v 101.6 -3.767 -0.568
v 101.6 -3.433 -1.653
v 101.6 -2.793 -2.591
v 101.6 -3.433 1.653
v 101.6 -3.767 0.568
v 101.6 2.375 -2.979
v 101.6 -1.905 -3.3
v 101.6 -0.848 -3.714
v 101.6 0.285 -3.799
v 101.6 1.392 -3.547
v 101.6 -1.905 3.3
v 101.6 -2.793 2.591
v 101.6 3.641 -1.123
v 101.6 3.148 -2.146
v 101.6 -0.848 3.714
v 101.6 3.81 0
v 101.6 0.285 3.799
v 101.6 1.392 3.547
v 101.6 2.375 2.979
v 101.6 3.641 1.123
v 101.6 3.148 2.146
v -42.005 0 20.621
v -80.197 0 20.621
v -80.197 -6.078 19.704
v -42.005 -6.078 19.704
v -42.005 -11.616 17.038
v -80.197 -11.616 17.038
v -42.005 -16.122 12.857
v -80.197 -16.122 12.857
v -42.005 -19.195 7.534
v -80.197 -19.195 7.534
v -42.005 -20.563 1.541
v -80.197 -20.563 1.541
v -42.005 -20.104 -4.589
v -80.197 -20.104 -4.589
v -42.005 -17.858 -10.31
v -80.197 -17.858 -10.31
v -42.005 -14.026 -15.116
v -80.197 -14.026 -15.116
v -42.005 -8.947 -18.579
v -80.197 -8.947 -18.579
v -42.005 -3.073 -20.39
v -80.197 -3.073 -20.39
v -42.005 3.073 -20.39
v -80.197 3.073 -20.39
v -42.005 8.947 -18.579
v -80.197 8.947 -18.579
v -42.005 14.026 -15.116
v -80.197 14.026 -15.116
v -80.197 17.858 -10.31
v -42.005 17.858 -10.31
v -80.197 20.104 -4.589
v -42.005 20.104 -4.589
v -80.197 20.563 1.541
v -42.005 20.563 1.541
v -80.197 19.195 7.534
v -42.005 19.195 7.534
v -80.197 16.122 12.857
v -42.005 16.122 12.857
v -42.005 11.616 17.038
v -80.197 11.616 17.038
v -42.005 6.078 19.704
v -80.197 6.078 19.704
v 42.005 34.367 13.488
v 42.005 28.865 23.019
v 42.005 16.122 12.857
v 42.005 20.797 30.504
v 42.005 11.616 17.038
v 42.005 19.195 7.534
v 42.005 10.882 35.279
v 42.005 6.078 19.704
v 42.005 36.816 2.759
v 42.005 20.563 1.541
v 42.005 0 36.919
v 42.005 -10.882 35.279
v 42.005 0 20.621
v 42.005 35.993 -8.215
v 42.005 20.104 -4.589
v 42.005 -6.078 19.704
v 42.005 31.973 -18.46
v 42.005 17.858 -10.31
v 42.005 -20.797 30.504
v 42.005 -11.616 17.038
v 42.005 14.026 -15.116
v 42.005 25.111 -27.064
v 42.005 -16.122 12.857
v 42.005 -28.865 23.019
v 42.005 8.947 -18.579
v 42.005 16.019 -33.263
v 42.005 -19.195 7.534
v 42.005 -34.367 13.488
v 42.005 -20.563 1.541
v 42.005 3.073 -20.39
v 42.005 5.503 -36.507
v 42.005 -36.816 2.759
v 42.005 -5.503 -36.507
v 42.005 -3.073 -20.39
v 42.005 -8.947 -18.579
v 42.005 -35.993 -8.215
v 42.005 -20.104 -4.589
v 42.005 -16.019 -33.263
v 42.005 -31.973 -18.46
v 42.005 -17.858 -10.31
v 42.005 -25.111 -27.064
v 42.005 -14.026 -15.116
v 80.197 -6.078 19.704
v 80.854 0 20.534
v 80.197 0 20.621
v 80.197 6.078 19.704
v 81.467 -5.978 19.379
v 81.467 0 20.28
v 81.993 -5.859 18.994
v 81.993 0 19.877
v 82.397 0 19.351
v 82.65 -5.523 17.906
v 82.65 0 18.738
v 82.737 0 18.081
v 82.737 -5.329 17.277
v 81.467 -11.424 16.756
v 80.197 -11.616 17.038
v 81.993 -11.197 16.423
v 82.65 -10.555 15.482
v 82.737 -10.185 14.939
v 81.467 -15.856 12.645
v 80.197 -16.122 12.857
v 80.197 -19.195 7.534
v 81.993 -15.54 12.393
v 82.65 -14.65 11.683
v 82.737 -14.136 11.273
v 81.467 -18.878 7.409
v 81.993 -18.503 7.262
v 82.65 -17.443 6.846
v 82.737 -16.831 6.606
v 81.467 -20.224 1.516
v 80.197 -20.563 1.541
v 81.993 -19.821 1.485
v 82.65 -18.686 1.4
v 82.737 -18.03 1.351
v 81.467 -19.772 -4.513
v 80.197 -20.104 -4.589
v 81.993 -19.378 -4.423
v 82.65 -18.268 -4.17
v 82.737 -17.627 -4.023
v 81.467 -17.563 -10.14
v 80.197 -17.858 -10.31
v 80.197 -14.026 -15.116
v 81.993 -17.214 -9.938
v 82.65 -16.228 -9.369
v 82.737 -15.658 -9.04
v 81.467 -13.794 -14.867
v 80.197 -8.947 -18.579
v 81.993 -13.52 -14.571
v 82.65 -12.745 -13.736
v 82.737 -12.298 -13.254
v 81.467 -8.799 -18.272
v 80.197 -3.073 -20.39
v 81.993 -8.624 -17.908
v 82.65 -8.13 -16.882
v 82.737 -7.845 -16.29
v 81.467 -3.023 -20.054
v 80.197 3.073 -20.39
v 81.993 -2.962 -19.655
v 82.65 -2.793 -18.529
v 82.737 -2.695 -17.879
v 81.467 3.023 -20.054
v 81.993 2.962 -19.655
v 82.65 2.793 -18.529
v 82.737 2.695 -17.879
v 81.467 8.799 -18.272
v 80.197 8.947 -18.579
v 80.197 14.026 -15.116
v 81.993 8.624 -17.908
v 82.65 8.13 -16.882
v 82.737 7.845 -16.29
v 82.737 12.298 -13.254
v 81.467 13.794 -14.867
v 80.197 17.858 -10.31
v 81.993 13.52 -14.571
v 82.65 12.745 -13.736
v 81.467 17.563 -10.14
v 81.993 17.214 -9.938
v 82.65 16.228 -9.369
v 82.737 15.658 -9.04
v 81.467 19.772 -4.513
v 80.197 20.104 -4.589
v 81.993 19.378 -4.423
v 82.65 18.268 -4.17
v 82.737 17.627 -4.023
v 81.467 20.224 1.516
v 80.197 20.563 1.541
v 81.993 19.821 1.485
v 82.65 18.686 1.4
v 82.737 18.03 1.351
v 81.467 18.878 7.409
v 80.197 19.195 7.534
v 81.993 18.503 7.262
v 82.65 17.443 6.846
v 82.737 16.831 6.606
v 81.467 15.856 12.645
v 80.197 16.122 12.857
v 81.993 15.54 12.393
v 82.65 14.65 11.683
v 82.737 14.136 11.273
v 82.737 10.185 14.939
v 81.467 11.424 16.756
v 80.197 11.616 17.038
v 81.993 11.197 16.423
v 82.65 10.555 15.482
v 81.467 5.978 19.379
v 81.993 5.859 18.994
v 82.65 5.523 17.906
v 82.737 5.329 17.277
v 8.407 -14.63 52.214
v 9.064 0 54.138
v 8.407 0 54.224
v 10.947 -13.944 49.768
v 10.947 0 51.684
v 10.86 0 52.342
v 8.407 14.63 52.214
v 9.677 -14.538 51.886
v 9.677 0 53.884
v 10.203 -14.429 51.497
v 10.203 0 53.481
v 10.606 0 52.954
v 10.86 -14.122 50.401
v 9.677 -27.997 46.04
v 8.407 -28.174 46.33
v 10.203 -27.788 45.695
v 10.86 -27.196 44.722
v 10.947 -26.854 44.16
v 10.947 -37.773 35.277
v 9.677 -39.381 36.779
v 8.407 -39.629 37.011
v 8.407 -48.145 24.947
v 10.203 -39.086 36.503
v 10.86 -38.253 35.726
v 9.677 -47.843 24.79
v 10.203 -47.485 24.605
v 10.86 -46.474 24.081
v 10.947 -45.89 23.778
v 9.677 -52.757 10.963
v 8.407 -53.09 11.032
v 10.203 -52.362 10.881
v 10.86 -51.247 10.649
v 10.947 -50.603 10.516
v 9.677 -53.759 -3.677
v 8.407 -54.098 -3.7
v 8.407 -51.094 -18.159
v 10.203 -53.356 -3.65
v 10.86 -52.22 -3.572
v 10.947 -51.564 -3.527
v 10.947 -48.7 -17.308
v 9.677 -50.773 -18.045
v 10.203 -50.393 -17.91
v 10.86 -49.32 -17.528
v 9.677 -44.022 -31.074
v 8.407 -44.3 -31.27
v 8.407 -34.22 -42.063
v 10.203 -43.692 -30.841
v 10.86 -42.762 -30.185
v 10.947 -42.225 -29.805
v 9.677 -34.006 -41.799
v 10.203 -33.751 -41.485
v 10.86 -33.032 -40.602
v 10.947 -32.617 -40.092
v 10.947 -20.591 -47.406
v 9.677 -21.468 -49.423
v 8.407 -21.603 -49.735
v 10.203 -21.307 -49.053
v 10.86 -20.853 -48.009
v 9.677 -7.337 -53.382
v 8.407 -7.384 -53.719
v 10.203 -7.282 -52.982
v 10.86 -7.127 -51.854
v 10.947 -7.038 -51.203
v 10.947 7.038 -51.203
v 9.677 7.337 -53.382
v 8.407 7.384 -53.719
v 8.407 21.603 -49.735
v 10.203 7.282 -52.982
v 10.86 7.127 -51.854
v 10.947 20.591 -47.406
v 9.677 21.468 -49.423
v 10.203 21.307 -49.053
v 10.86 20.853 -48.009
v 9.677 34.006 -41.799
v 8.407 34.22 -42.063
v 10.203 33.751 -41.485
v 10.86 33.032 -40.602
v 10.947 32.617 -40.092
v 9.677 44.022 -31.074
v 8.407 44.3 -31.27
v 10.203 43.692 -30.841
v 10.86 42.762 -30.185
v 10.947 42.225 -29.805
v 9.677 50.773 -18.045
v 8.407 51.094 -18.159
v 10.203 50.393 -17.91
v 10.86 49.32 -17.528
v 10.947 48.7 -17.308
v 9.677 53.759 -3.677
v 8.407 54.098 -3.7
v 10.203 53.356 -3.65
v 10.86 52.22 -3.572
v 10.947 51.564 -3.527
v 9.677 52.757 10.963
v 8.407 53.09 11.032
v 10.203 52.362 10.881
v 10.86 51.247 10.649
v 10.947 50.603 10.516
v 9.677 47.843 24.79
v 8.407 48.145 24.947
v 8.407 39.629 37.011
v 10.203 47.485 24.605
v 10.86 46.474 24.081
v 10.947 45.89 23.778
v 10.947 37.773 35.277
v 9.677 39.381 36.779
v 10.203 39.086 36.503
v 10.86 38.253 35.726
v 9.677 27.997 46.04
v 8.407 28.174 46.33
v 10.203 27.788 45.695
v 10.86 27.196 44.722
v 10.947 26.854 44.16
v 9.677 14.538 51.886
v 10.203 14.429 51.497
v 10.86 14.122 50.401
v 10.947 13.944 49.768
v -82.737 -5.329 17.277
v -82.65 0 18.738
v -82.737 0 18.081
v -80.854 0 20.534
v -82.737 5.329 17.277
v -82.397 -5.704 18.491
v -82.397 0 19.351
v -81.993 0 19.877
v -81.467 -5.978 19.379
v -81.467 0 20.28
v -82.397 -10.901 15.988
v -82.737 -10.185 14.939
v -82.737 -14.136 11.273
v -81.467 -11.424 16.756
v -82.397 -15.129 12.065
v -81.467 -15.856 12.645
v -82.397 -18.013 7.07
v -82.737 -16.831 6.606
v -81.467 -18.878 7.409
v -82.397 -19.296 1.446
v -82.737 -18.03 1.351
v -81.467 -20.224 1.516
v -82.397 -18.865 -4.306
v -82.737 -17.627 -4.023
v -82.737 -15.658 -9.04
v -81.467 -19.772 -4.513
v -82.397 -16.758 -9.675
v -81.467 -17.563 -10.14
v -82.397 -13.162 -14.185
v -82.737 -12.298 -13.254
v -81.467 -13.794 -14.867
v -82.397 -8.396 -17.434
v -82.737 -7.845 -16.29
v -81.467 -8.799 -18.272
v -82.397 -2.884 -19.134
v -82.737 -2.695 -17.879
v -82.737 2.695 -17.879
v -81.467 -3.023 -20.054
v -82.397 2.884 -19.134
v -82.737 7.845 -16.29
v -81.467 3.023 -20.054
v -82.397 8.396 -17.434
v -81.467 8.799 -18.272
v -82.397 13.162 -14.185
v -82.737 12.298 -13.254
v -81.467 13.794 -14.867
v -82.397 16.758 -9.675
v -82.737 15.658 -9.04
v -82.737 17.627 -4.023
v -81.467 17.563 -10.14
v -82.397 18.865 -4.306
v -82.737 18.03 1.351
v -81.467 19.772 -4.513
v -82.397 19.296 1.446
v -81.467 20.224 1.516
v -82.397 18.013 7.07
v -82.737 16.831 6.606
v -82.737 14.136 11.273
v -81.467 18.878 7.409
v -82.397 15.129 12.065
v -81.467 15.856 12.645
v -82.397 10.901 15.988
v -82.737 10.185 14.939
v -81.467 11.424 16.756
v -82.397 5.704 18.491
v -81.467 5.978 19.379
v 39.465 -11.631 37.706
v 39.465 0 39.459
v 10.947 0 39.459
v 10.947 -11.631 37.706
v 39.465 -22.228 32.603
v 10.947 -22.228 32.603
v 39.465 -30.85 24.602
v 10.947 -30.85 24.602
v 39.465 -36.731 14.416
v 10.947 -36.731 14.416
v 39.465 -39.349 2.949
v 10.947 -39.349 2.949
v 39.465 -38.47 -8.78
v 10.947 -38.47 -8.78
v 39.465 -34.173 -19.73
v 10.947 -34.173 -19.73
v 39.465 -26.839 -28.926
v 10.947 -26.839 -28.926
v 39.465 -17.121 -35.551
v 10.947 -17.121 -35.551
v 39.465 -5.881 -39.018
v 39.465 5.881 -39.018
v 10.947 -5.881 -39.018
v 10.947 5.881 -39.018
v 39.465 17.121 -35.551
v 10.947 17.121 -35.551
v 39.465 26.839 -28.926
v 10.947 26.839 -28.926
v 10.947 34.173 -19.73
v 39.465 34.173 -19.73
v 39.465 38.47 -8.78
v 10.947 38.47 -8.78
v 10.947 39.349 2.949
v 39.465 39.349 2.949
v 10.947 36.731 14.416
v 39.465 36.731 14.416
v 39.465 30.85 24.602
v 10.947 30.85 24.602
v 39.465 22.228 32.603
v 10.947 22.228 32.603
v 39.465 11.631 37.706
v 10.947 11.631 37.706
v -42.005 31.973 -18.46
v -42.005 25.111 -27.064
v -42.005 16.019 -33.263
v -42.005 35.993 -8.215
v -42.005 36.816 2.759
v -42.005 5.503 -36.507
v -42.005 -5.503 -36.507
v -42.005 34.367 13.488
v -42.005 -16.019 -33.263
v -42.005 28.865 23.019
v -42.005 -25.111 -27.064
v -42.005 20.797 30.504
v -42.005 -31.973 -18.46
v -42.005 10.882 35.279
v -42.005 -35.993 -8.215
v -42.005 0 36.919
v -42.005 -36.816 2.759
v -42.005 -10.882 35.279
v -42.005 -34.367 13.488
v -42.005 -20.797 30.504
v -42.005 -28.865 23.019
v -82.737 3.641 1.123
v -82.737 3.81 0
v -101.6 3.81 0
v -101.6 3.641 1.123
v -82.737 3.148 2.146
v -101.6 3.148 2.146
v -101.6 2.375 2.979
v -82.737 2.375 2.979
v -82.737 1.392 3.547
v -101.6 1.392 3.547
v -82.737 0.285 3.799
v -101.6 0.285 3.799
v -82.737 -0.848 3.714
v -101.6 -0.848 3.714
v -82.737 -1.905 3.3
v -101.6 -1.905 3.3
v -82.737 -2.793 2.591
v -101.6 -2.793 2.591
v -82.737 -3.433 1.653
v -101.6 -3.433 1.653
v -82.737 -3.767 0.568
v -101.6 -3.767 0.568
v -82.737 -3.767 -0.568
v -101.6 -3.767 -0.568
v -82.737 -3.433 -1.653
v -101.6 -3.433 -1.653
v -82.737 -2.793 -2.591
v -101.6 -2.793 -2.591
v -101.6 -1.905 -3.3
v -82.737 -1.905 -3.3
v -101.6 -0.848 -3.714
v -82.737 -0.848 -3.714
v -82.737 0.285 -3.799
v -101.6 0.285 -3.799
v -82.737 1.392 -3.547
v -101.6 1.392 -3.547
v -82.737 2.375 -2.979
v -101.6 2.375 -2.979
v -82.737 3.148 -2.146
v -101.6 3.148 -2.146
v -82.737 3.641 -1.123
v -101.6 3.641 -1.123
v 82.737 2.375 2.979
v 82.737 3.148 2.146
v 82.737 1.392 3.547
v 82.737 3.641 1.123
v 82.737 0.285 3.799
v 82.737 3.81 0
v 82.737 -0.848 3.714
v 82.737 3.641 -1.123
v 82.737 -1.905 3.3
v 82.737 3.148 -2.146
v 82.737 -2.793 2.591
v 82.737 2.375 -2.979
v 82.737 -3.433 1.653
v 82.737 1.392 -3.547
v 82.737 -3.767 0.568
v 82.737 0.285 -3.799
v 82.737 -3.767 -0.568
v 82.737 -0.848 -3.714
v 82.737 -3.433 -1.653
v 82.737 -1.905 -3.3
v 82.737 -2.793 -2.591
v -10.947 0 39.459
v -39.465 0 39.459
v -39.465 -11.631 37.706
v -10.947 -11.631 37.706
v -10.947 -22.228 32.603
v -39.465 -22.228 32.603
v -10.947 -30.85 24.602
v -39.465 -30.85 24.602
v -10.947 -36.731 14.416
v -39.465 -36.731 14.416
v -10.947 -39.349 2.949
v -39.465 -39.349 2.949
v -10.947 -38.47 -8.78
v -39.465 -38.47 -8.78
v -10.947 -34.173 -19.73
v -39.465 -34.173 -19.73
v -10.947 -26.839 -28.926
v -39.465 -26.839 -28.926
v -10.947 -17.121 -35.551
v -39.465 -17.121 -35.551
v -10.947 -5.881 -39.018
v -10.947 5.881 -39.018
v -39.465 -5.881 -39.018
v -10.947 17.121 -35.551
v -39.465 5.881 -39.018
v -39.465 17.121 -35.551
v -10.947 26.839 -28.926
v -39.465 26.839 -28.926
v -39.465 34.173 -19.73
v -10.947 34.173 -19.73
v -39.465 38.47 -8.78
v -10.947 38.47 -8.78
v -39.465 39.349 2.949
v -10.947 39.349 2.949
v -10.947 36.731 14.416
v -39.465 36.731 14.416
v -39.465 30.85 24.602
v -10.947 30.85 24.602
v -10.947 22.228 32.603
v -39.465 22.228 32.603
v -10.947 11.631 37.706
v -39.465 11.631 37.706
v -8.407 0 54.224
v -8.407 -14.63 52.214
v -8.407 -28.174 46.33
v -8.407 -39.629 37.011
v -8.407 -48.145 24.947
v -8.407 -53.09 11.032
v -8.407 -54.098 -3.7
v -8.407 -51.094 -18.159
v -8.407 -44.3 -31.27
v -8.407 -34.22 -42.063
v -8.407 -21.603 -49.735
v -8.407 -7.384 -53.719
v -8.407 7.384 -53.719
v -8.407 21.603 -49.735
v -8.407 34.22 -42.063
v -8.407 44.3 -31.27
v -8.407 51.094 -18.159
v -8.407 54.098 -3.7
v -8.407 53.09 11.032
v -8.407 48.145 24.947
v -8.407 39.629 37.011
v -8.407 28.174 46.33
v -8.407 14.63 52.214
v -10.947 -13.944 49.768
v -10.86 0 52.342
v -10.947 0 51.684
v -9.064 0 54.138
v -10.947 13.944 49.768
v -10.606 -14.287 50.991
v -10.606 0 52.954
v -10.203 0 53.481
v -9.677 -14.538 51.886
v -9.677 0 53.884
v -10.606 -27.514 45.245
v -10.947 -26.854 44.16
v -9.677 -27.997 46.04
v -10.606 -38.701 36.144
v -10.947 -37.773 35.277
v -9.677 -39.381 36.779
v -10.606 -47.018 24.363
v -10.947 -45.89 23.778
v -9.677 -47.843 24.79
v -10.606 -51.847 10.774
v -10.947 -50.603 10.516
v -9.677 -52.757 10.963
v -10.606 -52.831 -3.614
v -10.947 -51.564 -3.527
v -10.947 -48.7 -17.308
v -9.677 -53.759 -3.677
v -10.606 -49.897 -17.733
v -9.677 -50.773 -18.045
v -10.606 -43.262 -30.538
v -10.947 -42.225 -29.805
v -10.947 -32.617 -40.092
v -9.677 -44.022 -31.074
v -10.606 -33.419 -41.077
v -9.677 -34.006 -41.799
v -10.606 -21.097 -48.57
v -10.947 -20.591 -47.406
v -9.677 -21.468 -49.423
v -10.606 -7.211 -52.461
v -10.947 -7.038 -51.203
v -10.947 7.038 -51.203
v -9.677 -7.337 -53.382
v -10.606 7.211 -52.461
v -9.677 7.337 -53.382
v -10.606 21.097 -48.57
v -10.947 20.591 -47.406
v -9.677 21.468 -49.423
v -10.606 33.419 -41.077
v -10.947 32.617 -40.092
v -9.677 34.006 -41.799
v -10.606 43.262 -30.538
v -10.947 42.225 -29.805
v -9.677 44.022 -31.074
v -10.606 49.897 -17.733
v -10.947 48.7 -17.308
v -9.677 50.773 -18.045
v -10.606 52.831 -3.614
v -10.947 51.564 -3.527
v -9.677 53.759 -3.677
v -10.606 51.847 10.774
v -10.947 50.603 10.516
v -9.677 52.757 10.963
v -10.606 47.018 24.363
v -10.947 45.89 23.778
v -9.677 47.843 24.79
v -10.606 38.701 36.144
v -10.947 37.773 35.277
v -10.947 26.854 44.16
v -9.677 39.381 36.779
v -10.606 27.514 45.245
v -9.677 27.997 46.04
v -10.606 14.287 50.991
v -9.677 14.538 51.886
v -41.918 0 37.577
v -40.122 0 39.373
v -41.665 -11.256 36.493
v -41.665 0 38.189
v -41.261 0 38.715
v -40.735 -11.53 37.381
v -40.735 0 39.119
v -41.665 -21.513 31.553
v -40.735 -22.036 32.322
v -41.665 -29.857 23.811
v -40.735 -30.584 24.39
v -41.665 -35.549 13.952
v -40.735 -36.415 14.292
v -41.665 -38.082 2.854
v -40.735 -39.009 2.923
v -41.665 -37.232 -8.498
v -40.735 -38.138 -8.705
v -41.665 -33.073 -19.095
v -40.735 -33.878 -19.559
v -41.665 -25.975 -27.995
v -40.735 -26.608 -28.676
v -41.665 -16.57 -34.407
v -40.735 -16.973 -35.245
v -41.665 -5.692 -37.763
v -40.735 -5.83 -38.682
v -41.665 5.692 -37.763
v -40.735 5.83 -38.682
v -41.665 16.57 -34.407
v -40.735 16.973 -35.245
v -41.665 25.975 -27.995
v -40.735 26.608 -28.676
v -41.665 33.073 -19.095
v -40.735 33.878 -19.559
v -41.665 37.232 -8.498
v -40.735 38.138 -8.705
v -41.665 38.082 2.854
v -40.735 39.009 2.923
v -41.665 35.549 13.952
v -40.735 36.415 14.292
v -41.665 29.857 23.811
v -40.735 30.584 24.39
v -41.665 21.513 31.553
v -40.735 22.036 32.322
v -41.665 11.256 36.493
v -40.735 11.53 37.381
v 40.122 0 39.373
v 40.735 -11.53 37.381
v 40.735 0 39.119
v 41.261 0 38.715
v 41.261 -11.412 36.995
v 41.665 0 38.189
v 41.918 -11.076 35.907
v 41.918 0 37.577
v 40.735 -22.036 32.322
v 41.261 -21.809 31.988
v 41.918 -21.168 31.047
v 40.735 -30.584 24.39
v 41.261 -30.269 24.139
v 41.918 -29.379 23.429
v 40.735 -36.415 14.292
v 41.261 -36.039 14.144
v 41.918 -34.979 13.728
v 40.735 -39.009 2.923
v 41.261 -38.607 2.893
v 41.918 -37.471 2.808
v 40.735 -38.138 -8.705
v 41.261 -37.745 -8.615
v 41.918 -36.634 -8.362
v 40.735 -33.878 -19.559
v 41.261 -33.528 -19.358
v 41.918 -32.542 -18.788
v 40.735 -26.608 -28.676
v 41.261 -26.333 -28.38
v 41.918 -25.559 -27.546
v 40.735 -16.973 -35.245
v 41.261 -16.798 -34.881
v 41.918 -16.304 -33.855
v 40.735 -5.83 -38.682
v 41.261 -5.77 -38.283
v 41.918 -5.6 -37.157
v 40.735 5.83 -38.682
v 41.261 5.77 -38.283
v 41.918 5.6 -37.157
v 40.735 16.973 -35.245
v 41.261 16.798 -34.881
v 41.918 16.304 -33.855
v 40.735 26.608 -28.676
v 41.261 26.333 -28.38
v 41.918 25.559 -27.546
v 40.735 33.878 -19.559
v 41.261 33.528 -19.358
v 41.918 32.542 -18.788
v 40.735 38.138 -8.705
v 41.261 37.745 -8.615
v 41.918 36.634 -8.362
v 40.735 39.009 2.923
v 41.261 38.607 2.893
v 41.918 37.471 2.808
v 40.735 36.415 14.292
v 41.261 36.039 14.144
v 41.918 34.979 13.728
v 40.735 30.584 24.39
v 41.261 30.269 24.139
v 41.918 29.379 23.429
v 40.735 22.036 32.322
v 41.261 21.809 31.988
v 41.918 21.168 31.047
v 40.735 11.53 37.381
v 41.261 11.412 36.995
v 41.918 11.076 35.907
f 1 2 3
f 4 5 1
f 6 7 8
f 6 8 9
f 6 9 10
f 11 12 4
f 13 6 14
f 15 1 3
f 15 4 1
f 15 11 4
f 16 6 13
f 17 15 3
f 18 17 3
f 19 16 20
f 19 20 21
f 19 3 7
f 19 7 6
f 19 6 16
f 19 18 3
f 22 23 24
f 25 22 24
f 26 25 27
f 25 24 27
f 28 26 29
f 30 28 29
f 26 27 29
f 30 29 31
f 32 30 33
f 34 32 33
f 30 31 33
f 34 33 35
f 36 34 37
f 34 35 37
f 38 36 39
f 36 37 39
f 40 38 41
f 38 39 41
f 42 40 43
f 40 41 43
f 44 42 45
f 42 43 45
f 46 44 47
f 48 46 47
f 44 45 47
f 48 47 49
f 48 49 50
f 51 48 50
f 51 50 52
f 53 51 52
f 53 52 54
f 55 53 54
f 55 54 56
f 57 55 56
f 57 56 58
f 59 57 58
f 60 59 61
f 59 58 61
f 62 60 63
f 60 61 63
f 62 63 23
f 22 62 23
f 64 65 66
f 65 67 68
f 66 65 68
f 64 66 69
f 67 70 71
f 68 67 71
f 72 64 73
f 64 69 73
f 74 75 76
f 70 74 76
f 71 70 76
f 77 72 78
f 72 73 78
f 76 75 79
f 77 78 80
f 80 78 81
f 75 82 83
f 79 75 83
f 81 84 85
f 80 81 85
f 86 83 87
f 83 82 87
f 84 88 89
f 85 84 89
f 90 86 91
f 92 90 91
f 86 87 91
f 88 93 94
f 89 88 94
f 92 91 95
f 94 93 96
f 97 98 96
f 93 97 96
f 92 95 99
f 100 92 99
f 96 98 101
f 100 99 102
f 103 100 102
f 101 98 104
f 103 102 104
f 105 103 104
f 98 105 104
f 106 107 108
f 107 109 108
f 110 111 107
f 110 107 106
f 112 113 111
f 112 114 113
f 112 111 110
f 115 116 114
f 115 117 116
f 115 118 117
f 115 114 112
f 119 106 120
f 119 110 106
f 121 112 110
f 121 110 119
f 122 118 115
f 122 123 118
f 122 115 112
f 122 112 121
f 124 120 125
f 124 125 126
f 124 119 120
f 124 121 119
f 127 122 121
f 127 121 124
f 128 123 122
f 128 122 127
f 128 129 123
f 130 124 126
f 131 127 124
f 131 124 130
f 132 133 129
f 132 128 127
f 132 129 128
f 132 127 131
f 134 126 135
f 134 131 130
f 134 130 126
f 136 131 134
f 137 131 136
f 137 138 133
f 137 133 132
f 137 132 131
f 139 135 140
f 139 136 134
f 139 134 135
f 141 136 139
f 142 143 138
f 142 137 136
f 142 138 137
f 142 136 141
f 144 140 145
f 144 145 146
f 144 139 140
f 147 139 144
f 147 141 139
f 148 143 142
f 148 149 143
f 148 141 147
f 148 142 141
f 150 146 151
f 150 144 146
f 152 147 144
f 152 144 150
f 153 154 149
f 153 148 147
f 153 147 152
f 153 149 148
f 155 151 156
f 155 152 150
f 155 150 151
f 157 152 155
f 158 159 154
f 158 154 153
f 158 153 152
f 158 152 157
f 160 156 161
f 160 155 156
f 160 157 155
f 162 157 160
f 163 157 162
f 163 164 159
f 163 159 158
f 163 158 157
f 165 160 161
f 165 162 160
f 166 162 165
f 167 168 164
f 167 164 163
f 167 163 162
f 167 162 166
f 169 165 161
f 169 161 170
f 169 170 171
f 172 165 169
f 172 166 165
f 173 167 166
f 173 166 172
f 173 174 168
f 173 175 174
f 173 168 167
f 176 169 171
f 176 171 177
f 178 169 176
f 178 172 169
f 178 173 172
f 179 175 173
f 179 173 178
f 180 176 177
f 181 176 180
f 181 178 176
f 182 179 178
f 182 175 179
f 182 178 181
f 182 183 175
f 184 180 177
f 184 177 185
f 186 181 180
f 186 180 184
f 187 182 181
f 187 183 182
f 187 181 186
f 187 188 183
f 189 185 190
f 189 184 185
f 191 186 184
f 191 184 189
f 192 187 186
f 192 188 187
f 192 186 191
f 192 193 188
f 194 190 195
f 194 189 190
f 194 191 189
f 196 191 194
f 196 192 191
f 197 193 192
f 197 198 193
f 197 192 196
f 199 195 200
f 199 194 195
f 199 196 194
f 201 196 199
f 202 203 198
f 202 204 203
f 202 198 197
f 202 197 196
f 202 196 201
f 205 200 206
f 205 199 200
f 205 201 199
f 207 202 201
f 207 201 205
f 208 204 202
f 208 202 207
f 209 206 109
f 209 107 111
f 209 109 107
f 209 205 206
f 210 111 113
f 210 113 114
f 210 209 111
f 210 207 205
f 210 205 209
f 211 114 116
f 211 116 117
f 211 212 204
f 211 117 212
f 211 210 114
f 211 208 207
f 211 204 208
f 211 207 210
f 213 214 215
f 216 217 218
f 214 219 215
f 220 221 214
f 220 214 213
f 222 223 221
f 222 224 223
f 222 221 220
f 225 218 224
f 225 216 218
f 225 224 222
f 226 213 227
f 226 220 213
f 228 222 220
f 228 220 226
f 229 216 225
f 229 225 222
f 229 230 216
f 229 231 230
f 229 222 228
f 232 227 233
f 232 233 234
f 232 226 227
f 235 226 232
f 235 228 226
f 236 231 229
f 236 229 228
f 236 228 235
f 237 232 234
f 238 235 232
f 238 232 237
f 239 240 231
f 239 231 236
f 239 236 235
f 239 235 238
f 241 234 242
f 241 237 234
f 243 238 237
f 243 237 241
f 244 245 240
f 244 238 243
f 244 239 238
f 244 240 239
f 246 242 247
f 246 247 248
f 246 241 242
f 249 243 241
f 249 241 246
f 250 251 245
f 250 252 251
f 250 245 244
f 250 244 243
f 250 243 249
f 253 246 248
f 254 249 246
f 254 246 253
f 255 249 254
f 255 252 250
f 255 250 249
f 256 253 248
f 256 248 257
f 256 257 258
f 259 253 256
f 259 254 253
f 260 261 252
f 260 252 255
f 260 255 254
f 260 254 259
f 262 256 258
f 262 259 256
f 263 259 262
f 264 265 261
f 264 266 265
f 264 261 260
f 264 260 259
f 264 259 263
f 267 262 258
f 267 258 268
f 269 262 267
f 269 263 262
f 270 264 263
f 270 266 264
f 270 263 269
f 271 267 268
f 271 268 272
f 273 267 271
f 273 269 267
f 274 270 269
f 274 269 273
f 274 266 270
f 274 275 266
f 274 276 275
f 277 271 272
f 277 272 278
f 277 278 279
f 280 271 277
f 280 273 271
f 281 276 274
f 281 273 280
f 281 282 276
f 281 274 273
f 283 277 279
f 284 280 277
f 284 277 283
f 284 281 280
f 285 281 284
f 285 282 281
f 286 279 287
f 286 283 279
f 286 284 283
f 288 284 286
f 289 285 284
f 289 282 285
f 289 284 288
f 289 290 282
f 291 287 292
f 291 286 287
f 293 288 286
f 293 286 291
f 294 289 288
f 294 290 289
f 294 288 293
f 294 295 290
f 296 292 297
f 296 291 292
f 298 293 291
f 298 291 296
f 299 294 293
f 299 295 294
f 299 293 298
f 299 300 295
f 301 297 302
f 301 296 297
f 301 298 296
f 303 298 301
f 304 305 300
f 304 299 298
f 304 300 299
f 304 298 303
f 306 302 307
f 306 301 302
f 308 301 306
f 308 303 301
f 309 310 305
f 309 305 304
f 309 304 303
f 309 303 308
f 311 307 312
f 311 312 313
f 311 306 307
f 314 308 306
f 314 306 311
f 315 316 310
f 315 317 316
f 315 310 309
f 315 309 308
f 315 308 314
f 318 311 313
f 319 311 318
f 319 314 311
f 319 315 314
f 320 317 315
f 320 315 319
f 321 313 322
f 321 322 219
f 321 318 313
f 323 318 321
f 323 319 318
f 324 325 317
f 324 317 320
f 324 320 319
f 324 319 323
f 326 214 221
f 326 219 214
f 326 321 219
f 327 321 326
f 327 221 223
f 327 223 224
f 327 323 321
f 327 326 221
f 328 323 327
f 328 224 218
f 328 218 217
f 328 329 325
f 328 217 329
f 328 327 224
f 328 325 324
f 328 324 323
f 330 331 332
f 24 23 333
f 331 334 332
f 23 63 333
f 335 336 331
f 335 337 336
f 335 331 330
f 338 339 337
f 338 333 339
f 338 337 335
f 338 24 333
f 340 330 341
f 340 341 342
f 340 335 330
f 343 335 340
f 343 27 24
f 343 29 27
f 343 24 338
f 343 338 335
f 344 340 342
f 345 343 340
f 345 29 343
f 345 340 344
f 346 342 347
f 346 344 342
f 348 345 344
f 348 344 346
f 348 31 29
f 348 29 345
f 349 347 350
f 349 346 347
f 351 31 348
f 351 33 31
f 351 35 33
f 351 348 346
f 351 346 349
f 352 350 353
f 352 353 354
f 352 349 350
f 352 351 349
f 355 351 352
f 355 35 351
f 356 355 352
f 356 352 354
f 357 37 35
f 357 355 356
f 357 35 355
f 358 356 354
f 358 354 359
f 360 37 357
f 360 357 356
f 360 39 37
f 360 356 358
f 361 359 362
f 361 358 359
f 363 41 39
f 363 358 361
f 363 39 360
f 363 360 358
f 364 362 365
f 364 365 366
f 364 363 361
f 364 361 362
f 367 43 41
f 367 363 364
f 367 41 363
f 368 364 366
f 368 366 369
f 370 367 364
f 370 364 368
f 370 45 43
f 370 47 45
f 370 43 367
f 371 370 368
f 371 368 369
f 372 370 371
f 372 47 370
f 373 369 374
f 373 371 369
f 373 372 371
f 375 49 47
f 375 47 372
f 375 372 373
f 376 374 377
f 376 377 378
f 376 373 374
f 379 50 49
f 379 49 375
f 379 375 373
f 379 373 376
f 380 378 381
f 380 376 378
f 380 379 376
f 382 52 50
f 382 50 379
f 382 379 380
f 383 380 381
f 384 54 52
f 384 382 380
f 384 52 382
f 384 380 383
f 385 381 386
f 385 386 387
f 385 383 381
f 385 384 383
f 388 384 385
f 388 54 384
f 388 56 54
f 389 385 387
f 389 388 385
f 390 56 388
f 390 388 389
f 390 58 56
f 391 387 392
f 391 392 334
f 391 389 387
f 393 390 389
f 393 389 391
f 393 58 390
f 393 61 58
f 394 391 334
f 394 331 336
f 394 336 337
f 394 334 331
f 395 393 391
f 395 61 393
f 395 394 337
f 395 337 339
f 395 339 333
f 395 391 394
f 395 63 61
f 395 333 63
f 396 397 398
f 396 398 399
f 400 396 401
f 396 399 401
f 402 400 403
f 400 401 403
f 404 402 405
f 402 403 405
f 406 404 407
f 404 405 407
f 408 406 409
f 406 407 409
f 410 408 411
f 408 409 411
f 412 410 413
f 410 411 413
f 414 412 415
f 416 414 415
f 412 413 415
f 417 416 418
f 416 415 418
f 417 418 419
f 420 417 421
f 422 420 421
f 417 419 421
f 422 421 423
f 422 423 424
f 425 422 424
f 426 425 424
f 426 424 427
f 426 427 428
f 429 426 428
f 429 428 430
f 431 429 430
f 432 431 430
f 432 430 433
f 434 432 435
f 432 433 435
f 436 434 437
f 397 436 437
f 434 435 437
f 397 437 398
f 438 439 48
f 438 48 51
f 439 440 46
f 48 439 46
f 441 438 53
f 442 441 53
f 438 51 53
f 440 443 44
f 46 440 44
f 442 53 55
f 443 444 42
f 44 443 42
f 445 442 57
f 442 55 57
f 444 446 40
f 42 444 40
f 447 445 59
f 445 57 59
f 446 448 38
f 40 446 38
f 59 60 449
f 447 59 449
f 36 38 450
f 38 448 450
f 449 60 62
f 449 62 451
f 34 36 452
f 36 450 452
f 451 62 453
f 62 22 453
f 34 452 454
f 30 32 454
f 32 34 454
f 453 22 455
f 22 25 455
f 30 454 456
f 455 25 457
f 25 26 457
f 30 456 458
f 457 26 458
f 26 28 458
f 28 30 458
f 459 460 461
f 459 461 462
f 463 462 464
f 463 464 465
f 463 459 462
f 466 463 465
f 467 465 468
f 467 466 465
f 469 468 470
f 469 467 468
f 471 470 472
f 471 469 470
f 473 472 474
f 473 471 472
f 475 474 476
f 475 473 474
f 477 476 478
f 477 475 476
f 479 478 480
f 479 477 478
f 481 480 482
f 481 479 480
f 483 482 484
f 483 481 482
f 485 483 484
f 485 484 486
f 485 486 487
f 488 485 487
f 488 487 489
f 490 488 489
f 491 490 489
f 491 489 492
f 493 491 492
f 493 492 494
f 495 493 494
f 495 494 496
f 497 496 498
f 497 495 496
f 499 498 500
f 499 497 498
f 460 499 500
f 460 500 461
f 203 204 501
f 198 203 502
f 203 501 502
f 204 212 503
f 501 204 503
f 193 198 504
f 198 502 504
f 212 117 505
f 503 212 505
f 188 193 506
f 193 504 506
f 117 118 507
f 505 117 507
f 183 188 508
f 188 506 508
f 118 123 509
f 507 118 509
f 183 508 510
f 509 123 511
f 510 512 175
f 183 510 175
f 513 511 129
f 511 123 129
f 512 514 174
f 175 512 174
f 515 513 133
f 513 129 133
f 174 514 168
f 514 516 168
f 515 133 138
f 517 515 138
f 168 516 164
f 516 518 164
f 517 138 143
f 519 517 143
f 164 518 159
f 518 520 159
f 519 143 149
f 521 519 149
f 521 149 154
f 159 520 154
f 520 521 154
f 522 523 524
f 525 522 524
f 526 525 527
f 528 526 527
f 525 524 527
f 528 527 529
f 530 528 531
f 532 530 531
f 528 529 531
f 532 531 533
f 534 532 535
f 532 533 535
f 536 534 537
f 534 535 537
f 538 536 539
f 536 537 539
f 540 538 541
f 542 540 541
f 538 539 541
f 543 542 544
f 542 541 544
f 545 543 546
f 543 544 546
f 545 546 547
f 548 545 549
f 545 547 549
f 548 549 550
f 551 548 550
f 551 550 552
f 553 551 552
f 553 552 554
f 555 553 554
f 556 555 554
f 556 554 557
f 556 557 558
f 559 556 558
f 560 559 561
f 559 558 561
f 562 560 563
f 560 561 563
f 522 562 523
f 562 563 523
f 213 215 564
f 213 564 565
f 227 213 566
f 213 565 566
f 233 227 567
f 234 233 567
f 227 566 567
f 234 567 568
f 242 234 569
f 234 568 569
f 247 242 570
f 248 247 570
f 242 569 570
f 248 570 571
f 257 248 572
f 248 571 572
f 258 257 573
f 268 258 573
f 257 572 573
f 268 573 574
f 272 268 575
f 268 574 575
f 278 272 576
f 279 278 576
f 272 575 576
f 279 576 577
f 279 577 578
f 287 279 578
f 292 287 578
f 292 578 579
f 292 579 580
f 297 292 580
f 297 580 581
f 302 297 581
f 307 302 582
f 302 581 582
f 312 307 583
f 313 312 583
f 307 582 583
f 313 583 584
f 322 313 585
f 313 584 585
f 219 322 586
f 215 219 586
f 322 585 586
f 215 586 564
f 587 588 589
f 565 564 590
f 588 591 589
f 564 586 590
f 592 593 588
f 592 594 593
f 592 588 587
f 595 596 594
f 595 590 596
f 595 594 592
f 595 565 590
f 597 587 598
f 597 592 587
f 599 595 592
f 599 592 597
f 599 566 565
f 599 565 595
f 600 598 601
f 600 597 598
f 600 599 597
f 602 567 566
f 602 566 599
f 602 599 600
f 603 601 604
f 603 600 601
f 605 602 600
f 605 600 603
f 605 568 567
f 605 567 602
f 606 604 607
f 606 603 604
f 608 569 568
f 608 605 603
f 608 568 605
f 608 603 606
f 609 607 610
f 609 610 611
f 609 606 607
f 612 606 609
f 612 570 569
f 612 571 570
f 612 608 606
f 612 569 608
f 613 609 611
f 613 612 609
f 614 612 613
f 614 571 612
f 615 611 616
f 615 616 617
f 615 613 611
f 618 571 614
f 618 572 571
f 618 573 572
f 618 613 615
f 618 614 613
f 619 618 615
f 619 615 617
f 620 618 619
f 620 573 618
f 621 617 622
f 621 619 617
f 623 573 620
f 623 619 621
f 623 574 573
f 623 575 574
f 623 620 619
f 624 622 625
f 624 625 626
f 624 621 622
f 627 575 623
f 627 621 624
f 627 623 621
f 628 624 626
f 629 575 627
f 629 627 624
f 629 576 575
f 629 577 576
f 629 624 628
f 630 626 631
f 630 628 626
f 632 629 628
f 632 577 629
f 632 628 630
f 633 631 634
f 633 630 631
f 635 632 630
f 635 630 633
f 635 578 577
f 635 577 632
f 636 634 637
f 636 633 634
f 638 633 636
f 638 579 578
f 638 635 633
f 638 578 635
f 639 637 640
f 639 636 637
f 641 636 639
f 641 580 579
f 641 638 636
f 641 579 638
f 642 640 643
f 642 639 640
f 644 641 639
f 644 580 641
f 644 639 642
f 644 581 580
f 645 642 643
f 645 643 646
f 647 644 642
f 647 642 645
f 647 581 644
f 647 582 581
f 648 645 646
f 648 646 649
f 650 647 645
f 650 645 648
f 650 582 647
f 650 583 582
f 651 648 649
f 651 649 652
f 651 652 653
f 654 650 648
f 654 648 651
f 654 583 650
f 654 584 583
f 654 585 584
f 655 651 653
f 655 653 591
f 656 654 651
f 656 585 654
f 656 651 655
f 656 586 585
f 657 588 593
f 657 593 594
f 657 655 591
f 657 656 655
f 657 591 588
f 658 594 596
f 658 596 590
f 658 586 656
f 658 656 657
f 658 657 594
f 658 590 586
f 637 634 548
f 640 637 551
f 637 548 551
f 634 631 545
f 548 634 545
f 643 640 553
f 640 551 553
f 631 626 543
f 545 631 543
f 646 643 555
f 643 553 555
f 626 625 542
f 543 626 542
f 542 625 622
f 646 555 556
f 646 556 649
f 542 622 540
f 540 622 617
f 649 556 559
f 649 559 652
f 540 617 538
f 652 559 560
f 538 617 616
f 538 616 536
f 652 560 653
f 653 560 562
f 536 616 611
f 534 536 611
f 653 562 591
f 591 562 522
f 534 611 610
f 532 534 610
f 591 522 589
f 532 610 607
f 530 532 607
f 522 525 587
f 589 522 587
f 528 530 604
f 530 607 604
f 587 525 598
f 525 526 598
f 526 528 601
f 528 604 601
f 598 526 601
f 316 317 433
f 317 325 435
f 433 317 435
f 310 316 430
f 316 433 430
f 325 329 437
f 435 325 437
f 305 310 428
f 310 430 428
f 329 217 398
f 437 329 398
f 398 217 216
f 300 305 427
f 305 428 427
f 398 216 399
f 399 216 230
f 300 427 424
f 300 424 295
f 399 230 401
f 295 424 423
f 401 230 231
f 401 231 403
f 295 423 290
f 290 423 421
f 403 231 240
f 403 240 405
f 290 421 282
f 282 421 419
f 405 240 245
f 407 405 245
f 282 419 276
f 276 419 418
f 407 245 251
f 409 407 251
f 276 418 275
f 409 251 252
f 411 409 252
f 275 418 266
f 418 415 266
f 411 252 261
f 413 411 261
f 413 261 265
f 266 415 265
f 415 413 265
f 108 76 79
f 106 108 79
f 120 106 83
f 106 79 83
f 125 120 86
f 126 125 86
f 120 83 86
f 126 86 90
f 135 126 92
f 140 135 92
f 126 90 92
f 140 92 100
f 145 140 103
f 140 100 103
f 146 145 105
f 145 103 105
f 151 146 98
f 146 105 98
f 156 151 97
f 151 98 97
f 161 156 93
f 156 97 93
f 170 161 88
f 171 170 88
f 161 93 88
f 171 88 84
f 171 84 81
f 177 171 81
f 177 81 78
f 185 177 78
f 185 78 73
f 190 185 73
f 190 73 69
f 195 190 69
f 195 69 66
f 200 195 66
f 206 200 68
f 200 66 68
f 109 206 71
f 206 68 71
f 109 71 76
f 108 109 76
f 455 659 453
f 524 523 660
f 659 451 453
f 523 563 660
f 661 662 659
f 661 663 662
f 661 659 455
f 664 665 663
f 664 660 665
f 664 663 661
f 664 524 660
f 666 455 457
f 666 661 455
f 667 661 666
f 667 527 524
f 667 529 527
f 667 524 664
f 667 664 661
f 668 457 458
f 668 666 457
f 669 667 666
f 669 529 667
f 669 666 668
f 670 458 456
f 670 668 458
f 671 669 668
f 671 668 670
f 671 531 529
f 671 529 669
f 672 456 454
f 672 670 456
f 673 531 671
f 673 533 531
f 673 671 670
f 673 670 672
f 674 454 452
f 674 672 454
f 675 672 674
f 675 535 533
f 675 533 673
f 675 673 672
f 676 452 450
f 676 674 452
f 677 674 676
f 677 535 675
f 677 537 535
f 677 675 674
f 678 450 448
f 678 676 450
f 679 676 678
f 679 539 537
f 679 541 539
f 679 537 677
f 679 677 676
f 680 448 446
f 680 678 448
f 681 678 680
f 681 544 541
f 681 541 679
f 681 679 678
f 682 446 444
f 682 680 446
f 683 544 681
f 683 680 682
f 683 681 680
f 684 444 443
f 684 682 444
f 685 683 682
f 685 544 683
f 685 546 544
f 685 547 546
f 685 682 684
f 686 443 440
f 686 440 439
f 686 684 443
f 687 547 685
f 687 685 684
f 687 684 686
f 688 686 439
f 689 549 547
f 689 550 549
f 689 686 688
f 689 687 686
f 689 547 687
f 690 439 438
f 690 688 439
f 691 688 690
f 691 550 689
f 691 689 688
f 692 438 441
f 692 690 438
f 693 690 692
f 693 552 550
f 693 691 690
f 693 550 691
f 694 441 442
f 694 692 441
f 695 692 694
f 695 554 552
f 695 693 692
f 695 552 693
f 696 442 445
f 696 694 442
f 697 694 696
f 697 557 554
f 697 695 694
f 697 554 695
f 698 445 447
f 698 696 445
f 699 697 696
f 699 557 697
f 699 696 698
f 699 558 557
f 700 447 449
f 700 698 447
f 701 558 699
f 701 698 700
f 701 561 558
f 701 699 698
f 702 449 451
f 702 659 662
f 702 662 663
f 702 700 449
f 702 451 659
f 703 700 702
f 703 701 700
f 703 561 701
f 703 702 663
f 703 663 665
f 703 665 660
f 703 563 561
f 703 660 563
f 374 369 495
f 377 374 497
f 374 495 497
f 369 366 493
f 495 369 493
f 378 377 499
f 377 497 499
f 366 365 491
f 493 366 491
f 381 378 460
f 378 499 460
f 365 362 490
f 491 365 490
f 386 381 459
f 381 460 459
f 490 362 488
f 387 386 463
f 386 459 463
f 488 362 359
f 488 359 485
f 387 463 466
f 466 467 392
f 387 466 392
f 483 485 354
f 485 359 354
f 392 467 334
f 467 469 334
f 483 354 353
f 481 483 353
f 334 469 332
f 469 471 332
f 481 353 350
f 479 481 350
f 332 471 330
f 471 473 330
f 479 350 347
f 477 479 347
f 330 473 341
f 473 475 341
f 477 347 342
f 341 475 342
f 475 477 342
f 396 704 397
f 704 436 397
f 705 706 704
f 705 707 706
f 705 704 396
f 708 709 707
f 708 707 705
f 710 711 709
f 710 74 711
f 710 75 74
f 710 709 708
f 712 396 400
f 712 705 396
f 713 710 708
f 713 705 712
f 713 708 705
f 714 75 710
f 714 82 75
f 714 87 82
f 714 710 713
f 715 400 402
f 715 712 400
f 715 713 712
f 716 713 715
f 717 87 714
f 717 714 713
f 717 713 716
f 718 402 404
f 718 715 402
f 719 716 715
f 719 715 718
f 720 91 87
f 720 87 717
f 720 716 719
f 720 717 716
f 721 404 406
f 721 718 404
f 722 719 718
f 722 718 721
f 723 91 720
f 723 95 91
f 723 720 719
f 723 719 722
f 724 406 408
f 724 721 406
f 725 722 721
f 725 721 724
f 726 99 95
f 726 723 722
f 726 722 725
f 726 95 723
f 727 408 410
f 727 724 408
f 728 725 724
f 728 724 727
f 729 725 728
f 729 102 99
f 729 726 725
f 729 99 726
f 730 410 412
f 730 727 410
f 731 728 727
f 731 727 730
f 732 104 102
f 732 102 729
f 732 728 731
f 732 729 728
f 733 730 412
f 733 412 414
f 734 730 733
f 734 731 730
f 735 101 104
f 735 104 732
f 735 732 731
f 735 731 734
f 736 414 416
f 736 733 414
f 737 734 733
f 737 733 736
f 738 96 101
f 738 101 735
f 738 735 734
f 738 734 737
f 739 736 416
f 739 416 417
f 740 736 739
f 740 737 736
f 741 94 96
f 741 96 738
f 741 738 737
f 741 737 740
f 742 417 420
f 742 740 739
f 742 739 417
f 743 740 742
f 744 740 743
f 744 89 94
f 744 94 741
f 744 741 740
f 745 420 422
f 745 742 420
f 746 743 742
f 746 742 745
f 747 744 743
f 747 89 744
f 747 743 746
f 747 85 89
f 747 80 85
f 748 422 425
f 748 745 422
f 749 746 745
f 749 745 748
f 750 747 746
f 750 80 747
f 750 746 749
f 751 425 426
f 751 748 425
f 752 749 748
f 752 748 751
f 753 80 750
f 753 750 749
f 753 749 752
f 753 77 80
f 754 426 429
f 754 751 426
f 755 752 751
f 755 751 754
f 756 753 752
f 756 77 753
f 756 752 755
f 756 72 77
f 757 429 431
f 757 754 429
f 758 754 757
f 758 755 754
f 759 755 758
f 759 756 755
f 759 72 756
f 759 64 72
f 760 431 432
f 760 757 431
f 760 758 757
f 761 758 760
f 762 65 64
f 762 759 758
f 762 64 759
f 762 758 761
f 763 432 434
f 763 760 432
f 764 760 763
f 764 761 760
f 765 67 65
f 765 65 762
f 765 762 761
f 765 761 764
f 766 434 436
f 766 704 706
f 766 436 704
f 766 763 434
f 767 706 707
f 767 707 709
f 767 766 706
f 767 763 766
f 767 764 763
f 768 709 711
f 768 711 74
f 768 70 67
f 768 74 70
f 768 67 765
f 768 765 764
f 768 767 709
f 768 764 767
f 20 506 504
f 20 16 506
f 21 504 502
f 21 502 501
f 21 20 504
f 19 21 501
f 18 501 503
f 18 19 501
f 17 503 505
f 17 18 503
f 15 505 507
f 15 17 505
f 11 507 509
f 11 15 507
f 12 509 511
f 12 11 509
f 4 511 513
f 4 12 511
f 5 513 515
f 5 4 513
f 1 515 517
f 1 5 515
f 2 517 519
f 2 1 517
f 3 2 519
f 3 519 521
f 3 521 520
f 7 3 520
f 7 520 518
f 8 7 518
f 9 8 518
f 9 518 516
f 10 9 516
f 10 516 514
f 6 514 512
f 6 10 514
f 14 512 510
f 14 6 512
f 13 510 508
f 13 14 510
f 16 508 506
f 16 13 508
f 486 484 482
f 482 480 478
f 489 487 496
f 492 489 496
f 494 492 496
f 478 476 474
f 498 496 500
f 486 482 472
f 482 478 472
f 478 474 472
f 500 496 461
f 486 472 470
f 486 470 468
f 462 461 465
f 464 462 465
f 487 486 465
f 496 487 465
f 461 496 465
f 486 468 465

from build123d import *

# Parameters (mm, degrees)
F0_R     = 3.81
F1_DEPTH = 101.6
F4_R     = 2.54


with BuildPart() as f1:
    # F0 (on Right) → F1 (new body, symmetric)
    with BuildSketch(Plane.YZ):
        Circle(F0_R)
    extrude(amount=F1_DEPTH, both=True)

    # F2 (on Front) → F3 (revolve)
    with BuildSketch(Plane.XZ):
        Polygon((-82.736909, 20.620583), (-82.736909, 0), (82.736909, 0), (82.736909, 20.620583), (42.004891, 20.620583), (42.004891, 39.459139), (10.946727, 39.459139), (10.946727, 54.224499), (0, 54.224499), (-10.946727, 54.224499), (-10.946727, 39.459139), (-42.004891, 39.459139), (-42.004891, 20.620583), align=None)
    revolve(axis=Axis((0, 0, 0), (1, 0, 0)))

    # F4
    f4_edges = [f1.edges().sort_by_distance(p)[0] for p in [
        (-10.946727, 0, -54.224499),
        (-42.004891, 0, -39.459139),
        (-82.736909, 0, -20.620583),
        (10.946727, 0, -54.224499),
        (42.004891, 0, -39.459139),
        (82.736909, 0, -20.620583),
    ]]
    fillet(f4_edges, radius=F4_R)


solid = f1.part
